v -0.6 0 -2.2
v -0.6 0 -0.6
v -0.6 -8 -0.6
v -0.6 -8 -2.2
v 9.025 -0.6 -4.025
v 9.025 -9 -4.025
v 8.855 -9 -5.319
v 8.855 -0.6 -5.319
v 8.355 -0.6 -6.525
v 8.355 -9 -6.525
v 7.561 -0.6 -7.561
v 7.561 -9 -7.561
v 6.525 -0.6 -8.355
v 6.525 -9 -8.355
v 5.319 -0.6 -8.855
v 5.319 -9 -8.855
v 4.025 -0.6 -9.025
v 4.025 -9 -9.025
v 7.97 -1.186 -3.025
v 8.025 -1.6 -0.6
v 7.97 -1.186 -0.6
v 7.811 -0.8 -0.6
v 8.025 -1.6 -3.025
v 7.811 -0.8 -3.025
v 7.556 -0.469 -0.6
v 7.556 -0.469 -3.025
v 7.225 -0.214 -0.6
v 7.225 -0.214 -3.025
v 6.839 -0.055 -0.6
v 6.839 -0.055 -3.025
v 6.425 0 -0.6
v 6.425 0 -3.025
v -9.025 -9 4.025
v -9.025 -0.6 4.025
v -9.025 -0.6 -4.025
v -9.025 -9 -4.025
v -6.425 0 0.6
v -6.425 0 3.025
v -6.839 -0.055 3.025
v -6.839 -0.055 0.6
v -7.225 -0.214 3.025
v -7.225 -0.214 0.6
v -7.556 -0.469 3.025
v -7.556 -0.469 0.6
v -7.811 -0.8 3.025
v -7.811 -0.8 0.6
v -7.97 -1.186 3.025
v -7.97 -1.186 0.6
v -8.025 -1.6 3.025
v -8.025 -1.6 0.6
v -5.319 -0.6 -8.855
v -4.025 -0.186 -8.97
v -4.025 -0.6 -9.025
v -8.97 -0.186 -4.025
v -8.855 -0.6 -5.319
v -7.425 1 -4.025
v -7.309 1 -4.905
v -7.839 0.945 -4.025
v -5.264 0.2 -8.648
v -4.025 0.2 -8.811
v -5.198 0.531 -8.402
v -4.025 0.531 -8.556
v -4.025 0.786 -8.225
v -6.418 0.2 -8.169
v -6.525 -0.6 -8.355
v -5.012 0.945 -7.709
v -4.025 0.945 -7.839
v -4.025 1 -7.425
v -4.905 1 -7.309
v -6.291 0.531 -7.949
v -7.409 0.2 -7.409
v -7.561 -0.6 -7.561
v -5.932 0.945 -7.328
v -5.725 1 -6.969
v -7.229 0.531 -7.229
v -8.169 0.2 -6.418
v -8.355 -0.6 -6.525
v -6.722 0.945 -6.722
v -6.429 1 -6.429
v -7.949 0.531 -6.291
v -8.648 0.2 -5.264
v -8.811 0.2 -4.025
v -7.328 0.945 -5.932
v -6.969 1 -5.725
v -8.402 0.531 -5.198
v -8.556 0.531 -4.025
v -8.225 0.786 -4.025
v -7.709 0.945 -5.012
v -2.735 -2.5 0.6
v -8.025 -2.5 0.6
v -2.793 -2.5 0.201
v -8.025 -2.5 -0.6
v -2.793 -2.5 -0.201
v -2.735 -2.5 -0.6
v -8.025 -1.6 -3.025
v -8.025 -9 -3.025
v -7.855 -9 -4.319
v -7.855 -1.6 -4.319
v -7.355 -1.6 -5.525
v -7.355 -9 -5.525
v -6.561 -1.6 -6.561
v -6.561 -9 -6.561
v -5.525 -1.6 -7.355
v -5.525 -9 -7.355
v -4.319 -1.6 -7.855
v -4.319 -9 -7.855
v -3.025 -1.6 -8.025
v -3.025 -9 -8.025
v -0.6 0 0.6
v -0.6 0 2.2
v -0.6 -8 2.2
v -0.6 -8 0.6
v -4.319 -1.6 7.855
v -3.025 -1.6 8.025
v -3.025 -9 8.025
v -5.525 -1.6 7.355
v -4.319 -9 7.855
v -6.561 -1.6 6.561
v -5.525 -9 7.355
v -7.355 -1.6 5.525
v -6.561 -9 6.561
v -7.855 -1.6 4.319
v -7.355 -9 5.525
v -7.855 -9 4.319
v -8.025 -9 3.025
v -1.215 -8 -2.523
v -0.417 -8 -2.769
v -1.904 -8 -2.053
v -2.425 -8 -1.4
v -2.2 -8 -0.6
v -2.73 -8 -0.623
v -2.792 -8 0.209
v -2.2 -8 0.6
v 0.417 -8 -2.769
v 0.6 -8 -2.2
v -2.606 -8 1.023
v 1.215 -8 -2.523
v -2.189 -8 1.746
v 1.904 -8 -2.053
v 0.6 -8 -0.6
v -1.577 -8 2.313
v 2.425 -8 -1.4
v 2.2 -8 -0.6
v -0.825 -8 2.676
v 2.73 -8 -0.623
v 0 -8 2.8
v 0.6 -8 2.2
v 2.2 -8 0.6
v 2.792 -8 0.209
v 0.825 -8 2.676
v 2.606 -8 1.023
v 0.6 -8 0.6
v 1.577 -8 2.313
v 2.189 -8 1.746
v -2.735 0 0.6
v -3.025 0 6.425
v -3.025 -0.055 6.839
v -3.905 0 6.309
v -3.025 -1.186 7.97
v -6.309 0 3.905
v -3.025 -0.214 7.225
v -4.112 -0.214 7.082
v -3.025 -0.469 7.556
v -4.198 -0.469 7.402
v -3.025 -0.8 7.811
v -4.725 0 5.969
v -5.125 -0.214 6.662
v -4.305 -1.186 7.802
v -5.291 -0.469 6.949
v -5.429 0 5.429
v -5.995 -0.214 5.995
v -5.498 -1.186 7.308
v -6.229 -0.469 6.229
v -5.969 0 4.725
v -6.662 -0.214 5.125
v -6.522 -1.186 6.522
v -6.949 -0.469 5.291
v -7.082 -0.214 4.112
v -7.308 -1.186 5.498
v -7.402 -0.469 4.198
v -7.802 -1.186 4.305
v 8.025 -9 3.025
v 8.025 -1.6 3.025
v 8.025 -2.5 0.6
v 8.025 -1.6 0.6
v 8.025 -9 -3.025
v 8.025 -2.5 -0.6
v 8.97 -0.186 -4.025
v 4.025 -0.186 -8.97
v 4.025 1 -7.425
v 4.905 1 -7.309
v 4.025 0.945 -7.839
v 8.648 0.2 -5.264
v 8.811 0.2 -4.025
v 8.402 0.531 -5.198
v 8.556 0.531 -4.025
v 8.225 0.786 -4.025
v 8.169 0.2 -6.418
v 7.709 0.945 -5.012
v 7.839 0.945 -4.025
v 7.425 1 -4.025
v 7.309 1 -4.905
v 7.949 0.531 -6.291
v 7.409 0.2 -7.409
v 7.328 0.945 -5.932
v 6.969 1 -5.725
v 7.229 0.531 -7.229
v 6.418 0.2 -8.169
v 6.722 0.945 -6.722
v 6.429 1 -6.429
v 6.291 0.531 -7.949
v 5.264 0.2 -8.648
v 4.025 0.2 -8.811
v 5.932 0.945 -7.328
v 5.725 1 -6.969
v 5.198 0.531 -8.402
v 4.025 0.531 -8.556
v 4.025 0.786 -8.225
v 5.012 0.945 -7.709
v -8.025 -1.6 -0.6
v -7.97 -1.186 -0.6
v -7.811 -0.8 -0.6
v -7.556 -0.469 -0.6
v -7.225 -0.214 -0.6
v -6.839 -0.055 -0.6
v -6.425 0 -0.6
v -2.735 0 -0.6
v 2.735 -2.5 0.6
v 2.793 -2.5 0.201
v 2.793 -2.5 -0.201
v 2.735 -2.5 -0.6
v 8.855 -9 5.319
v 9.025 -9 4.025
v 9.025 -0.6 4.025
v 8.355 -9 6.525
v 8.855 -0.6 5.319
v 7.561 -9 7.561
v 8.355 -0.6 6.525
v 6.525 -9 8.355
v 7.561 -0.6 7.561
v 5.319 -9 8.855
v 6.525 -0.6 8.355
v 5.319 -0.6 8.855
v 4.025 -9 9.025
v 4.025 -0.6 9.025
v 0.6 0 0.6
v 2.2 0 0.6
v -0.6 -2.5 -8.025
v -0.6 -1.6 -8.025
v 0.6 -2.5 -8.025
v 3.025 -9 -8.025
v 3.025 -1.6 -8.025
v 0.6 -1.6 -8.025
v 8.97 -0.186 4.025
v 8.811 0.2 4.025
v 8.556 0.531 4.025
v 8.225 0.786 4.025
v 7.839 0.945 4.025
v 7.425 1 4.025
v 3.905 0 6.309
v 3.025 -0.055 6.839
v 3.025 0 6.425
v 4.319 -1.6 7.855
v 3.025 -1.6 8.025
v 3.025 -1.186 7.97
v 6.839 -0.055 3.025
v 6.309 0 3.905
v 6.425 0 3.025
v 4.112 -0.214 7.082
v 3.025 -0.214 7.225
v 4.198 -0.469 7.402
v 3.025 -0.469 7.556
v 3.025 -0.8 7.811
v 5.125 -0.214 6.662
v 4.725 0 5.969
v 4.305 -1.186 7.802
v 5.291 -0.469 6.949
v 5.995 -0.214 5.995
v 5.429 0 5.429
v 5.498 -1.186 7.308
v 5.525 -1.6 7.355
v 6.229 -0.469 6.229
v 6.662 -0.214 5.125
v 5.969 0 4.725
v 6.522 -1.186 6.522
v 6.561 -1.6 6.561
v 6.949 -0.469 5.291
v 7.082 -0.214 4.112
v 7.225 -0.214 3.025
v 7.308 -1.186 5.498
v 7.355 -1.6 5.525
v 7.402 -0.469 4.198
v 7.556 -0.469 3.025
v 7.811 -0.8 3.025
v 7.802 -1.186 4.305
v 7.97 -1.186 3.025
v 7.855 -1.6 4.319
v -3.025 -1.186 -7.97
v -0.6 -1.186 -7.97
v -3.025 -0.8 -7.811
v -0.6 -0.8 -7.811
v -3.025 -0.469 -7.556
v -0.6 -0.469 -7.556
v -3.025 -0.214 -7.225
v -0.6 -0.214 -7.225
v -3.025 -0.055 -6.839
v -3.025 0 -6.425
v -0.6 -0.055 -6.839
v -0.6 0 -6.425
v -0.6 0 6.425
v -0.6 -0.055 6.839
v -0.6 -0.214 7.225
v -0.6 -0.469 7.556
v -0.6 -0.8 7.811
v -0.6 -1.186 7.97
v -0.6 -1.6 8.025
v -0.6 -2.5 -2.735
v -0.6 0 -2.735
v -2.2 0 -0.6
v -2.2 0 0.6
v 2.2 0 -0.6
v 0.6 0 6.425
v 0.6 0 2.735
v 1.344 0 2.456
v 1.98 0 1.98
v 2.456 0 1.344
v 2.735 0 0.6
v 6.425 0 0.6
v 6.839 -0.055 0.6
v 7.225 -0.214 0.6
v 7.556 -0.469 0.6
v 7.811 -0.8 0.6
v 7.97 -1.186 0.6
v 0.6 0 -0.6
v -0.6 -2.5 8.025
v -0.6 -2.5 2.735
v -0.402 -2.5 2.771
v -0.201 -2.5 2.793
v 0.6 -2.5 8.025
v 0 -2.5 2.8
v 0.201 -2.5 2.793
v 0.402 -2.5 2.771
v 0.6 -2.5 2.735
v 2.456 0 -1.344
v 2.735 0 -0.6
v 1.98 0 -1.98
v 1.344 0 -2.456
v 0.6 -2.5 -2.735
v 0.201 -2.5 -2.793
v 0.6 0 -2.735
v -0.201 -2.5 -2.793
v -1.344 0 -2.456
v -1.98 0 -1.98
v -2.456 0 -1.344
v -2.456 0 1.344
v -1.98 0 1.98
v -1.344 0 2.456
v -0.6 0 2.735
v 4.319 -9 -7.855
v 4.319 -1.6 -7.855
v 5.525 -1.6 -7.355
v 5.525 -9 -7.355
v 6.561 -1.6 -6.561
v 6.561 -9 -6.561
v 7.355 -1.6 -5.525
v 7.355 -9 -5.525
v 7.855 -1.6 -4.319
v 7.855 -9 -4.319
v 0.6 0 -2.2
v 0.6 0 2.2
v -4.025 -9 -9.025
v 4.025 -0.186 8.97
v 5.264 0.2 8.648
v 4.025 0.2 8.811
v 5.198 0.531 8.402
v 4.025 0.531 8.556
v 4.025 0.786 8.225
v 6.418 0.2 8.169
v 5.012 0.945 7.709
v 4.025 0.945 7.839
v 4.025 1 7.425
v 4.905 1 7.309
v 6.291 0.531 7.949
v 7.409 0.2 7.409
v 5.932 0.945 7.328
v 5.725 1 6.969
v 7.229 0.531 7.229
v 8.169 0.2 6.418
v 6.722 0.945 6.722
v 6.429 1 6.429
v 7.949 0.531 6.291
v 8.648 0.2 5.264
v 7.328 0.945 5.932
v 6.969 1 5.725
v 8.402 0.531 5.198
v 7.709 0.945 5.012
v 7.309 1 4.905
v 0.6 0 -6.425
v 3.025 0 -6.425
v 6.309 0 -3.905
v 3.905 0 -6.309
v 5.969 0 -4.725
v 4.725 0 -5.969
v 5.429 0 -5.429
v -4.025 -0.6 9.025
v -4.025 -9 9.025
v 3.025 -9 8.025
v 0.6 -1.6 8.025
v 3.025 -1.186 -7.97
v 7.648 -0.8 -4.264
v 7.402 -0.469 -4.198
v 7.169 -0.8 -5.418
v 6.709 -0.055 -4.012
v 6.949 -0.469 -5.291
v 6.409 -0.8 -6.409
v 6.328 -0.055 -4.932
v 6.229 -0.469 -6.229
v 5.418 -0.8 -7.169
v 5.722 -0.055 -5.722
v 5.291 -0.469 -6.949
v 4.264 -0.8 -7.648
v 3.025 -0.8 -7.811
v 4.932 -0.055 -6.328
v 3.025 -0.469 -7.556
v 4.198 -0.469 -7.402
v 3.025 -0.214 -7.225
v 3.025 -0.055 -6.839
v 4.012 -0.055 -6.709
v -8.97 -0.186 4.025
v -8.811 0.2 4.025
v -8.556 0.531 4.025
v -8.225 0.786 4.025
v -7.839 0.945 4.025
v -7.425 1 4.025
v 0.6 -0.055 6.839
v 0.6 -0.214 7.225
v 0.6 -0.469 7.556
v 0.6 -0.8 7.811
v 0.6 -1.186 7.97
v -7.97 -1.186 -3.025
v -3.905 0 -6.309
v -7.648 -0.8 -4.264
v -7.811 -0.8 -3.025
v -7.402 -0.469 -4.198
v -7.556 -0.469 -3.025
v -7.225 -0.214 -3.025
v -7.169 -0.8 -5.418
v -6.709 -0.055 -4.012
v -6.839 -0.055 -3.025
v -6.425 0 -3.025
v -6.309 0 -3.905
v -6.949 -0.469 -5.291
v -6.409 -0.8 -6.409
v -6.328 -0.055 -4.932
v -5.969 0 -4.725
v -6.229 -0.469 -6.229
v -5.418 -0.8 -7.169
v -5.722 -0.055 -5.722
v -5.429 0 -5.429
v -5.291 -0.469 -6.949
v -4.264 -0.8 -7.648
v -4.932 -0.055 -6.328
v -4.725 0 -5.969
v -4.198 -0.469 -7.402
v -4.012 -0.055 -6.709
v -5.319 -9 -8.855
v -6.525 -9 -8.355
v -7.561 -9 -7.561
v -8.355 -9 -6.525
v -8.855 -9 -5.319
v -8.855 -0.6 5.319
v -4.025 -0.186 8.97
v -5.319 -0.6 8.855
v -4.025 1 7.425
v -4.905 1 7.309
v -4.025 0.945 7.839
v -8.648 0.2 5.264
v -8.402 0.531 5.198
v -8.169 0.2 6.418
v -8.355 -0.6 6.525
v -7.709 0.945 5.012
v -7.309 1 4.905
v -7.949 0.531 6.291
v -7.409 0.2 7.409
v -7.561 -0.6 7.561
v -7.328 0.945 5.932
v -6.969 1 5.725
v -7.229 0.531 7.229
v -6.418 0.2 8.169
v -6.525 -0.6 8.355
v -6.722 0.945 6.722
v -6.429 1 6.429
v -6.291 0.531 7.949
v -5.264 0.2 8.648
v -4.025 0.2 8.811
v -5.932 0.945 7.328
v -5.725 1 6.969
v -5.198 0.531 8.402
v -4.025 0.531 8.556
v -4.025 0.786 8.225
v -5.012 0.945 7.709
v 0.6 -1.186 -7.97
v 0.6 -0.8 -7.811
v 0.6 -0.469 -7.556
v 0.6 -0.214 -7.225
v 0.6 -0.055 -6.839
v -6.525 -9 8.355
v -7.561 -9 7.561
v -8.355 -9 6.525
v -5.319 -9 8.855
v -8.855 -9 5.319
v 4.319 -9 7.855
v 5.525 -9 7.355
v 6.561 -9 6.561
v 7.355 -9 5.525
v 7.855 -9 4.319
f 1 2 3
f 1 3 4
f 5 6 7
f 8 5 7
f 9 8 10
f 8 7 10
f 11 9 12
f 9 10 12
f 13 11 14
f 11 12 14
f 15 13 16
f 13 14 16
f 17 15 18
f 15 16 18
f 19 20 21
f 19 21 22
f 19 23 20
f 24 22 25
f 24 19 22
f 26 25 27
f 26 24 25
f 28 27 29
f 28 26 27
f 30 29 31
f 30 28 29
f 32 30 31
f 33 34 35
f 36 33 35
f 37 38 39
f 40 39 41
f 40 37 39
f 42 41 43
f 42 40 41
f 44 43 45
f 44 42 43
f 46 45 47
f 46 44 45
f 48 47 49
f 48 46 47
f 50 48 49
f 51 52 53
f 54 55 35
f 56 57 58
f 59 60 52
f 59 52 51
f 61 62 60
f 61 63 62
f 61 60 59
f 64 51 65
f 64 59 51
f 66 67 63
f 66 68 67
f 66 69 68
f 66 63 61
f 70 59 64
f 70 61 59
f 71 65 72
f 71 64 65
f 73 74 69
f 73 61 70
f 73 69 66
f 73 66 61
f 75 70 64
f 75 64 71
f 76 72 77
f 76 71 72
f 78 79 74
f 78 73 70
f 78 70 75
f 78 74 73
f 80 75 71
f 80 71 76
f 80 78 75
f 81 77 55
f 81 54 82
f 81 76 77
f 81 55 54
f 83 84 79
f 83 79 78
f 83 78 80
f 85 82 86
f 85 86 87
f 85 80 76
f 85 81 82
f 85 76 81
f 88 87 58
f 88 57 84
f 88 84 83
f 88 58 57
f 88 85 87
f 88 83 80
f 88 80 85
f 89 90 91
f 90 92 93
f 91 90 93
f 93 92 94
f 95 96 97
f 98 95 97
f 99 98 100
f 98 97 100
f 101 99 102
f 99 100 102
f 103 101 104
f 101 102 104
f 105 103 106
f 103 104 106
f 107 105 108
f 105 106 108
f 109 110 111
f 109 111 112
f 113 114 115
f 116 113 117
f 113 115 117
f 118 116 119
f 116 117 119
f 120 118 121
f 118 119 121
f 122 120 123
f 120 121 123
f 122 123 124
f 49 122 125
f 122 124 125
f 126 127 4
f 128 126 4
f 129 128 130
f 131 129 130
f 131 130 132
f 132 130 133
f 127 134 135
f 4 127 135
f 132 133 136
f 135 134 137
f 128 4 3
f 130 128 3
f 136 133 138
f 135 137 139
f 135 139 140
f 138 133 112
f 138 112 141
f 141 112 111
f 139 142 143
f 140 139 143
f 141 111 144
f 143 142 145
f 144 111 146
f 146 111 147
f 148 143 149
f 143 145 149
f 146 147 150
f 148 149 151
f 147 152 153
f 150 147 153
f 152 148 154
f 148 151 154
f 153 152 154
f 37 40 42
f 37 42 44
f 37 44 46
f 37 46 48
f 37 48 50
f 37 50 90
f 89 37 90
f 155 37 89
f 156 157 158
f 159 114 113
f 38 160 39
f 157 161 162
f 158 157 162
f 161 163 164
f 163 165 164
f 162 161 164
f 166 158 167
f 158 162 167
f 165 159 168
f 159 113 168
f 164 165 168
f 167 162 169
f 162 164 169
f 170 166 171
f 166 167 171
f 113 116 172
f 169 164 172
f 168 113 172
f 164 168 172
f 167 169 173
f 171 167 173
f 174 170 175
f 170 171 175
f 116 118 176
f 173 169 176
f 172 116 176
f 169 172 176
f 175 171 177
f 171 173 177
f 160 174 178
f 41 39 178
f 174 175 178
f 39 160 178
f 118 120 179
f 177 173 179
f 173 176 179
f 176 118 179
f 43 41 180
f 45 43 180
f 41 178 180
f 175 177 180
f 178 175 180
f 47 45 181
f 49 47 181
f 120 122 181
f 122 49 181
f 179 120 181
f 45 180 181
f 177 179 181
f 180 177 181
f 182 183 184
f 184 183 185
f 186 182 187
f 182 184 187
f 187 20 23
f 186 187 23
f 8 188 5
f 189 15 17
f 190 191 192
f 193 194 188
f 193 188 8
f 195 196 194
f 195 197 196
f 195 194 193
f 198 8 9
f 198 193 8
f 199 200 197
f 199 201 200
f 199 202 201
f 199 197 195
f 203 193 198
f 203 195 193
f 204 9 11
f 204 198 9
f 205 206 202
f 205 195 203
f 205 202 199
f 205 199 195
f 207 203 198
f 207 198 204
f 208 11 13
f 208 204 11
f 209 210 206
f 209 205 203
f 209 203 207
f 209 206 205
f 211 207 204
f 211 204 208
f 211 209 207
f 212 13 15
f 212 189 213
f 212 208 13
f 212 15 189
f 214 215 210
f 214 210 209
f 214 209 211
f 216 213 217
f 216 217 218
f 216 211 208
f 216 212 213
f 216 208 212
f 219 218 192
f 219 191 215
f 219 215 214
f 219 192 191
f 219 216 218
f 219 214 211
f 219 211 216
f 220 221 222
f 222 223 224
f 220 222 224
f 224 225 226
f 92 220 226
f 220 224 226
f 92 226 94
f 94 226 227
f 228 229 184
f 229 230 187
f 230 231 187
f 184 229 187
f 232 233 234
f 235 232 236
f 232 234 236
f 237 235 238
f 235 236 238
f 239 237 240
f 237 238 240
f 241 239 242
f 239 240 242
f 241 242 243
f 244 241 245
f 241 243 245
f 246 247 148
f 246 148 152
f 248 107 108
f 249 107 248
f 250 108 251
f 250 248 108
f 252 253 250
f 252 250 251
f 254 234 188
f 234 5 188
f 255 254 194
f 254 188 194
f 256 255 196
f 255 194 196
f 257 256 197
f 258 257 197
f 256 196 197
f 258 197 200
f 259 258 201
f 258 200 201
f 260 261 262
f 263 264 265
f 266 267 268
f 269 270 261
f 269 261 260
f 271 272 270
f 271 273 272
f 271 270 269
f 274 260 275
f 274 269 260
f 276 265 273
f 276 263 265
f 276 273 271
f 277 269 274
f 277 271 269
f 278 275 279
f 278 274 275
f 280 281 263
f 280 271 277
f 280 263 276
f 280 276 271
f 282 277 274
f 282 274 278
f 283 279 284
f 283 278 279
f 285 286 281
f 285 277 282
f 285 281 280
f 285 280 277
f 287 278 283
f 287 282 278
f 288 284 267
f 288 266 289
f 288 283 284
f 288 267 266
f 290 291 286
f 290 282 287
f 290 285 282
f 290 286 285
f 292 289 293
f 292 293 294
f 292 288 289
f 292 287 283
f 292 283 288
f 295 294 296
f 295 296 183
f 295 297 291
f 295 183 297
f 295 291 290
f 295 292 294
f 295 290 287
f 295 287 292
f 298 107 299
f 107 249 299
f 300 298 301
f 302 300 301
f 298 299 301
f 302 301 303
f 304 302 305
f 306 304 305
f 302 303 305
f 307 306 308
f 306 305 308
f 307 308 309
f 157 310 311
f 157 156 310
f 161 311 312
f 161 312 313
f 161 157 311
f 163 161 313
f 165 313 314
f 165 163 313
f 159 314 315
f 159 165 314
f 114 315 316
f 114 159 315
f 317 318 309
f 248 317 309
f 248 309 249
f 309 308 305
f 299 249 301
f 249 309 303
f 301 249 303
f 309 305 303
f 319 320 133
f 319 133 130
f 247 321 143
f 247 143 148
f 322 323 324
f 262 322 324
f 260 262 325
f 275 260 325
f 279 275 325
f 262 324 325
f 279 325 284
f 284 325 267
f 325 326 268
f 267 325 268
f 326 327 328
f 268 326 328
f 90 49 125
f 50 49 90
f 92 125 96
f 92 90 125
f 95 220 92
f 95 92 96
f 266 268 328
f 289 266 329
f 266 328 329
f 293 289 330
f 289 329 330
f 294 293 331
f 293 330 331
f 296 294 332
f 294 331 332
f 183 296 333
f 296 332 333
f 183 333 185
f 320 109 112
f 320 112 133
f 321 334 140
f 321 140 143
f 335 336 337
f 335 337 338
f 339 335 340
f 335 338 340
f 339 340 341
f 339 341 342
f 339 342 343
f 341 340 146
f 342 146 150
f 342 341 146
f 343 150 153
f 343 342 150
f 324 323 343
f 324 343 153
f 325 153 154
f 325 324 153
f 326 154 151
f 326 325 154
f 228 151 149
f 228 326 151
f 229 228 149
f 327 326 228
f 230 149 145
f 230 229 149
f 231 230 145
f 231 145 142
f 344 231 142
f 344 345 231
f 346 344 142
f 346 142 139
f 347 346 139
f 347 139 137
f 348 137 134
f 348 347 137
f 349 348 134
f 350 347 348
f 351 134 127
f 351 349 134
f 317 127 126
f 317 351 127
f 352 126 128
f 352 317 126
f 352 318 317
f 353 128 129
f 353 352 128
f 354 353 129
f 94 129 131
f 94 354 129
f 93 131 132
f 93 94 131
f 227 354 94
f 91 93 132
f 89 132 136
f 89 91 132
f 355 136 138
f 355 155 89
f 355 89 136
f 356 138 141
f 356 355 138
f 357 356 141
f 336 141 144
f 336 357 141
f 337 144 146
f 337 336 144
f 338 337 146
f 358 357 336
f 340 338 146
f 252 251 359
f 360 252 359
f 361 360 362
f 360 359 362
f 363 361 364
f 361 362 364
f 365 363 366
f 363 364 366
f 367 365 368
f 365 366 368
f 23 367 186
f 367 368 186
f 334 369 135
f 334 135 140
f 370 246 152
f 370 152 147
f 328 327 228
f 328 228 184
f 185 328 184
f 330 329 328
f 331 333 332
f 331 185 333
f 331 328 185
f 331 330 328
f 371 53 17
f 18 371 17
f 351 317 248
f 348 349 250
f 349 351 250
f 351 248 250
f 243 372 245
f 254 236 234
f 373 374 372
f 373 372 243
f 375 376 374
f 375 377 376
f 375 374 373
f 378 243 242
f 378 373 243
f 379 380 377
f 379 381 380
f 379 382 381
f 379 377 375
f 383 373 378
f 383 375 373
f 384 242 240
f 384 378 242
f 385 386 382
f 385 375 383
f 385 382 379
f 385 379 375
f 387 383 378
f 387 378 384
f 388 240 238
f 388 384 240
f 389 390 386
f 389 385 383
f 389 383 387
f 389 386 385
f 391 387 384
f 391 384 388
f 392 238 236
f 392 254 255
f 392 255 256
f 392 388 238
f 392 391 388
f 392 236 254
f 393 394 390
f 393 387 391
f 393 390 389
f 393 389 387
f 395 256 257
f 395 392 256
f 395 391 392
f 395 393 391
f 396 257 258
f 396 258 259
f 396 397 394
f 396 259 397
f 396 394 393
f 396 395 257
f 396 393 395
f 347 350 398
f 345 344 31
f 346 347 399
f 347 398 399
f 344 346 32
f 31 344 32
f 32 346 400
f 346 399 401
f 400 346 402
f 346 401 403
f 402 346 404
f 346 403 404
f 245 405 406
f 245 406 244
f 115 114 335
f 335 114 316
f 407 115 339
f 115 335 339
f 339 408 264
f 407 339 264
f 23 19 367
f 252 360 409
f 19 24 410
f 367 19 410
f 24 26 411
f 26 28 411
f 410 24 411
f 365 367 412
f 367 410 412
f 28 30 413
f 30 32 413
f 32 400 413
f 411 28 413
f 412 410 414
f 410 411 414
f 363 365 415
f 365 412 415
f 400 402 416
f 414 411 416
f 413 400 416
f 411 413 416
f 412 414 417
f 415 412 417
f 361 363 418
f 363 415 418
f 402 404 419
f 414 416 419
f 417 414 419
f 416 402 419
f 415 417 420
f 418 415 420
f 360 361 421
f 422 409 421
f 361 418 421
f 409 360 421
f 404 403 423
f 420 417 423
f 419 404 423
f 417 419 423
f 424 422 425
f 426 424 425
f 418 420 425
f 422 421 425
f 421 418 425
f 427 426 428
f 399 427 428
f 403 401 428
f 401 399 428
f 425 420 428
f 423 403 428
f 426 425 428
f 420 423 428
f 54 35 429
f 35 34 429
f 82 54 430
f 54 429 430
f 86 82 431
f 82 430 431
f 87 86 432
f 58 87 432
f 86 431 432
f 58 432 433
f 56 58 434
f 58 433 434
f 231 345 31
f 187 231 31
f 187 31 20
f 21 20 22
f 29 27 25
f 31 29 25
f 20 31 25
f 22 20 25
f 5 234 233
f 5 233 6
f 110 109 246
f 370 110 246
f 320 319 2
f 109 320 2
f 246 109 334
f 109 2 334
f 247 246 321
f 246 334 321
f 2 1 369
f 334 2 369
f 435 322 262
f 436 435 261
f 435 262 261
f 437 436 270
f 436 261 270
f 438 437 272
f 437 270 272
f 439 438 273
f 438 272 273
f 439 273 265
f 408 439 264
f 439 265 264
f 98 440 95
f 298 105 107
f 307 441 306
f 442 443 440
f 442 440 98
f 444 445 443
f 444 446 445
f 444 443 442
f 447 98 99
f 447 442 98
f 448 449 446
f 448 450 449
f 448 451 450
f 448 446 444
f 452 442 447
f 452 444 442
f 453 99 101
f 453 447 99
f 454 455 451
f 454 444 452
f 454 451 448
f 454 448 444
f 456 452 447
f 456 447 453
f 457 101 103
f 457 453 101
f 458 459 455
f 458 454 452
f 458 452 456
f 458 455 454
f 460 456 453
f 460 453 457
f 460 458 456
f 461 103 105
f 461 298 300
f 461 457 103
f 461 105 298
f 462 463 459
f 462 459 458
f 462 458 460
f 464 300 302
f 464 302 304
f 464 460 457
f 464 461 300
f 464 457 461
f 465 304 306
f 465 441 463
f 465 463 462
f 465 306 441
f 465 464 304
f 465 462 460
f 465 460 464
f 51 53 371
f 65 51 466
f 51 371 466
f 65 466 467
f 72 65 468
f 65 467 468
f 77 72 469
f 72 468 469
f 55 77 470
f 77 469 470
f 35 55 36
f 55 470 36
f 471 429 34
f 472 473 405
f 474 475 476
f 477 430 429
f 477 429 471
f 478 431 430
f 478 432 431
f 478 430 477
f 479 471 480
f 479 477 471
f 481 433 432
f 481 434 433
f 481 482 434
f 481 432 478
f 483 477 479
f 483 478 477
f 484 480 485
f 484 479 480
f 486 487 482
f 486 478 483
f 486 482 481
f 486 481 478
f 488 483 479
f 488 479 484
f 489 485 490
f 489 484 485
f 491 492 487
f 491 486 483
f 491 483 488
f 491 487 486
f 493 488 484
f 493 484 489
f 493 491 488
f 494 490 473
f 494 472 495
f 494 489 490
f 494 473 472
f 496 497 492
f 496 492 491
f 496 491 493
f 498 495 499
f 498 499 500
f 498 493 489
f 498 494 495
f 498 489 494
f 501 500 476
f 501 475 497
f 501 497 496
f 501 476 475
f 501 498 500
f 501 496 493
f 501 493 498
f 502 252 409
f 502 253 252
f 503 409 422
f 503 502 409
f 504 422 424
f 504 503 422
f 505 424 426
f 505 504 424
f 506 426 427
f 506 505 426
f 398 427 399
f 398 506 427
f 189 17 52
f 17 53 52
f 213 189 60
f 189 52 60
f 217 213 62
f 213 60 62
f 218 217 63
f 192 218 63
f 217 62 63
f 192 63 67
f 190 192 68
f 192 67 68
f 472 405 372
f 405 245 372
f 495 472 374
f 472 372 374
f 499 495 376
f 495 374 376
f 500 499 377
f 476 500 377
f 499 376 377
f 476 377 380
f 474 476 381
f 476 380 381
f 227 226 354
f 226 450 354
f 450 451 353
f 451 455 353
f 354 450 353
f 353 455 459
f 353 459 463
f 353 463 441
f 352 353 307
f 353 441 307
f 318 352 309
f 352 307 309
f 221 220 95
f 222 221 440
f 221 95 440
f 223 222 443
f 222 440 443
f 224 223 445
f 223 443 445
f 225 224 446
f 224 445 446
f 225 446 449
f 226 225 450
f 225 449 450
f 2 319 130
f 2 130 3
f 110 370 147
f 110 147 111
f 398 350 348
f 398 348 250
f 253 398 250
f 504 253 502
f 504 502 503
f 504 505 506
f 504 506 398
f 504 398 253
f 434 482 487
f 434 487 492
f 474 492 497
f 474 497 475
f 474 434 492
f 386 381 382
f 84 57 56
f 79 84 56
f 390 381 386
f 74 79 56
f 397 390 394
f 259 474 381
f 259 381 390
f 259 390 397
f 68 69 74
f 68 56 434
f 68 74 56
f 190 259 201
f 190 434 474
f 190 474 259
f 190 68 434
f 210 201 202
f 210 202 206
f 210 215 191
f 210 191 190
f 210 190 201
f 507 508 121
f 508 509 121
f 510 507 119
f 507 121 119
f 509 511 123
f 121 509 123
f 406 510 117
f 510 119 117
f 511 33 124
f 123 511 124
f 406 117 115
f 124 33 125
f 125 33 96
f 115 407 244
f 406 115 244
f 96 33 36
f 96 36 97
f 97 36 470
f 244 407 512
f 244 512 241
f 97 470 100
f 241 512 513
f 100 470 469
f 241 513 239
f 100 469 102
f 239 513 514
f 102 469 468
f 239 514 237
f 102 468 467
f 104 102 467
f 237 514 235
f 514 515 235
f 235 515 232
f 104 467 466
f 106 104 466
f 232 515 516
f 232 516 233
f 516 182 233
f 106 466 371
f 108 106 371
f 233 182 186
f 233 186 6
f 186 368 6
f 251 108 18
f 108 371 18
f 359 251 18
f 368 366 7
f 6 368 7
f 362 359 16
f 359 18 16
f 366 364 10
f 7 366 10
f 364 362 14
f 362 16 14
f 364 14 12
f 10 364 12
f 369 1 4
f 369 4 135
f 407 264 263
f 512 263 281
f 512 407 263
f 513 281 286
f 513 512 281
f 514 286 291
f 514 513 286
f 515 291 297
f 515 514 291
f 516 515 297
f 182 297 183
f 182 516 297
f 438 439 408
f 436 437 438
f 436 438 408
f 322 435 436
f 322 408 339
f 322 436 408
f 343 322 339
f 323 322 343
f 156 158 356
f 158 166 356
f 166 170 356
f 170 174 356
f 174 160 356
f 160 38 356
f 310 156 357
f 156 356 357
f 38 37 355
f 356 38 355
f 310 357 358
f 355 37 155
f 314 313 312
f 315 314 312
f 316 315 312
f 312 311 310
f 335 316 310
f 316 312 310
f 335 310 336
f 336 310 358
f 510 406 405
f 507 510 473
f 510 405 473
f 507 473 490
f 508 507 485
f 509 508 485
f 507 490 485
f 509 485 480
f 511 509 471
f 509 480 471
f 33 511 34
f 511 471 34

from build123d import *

# Parameters (mm, degrees)
SKETCH_1_R      = 2.8
EXTRUDE_1_DEPTH = 8
SKETCH_2_W      = 18.05
SKETCH_2_H      = 18.05
EXTRUDE_2_DEPTH = 1
SKETCH_3_W      = 18.05
SKETCH_3_H      = 18.05
SKETCH_3_W_2    = 16.05
SKETCH_3_H_2    = 16.05
EXTRUDE_3_DEPTH = 9
SKETCH_6_W      = 1.2
SKETCH_6_H      = 5.825
SKETCH_6_W_2    = 5.825
SKETCH_6_H_2    = 1.2
EXTRUDE_4_DEPTH = 2.5
FILLET_3_R      = 5
FILLET_4_R      = 1.6


with BuildPart() as part:
    # 草图1 → 凸台-拉伸1 (new body)
    with BuildSketch(Plane(origin=(0, 0, 0), x_dir=(1, 0, 0), z_dir=(0, 1, 0))):
        with Locations(Location((0, 0, 0), (0, 0, 270))):
            Circle(SKETCH_1_R)
        Polygon((2.2, 0.6), (2.2, -0.6), (0.6, -0.6), (0.6, -2.2), (-0.6, -2.2), (-0.6, -0.6), (-2.2, -0.6), (-2.2, 0.6), (-0.6, 0.6), (-0.6, 2.2), (0.6, 2.2), (0.6, 0.6), align=None, mode=Mode.SUBTRACT)
    extrude(amount=-EXTRUDE_1_DEPTH)

    # 草图2 → 凸台-拉伸2 (add)
    with BuildSketch(Plane(origin=(0, 0, 0), x_dir=(1, 0, 0), z_dir=(0, 1, 0))):
        Rectangle(SKETCH_2_W, SKETCH_2_H)
    extrude(amount=EXTRUDE_2_DEPTH)

    # 草图3 → 凸台-拉伸3 (add)
    with BuildSketch(Plane(origin=(0, 0, 0), x_dir=(1, 0, 0), z_dir=(0, 1, 0))):
        Rectangle(SKETCH_3_W, SKETCH_3_H)
        Rectangle(SKETCH_3_W_2, SKETCH_3_H_2, mode=Mode.SUBTRACT)
    extrude(amount=-EXTRUDE_3_DEPTH)

    # 草图6 → 凸台-拉伸4 (add)
    with BuildSketch(Plane(origin=(0, 0, 0), x_dir=(1, 0, 0), z_dir=(0, 1, 0))):
        with Locations((0, 5.1125)):
            Rectangle(SKETCH_6_W, SKETCH_6_H)
        with Locations((5.1125, 0)):
            Rectangle(SKETCH_6_W_2, SKETCH_6_H_2)
        with Locations((0, -5.1125)):
            Rectangle(SKETCH_6_W, SKETCH_6_H)
        with Locations((-5.1125, 0)):
            Rectangle(SKETCH_6_W_2, SKETCH_6_H_2)
    extrude(amount=-EXTRUDE_4_DEPTH)

    # 圆角3
    fillet_3_edges = [part.edges().sort_by_distance(p)[0] for p in [
        (9.025, -4, 9.025),
        (9.025, -4, -9.025),
        (-9.025, -4, -9.025),
        (-9.025, -4, 9.025),
        (-8.025, -4.5, 8.025),
        (-8.025, -4.5, -8.025),
        (8.025, -4.5, -8.025),
        (8.025, -4.5, 8.025),
    ]]
    fillet(fillet_3_edges, radius=FILLET_3_R)

    # 圆角4
    fillet_4_edges = [part.edges().sort_by_distance(p)[0] for p in [
        (-8.025, 0, 1.8125),
        (-1.8125, 0, -8.025),
        (8.025, 0, -1.8125),
        (8.025, 0, 1.8125),
        (6.560533906, 0, 6.560533906),
        (-1.8125, 0, 8.025),
        (-6.560533906, 0, 6.560533906),
        (-8.025, 0, -1.8125),
        (-6.560533906, 0, -6.560533906),
        (1.8125, 0, -8.025),
        (6.560533906, 0, -6.560533906),
        (0, 1, 9.025),
        (-9.025, 1, 0),
        (9.025, 1, 0),
        (0, 1, -9.025),
        (-7.560533906, 1, -7.560533906),
        (7.560533906, 1, -7.560533906),
        (7.560533906, 1, 7.560533906),
        (-7.560533906, 1, 7.560533906),
        (1.8125, 0, 8.025),
    ]]
    fillet(fillet_4_edges, radius=FILLET_4_R)


solid = part.part
